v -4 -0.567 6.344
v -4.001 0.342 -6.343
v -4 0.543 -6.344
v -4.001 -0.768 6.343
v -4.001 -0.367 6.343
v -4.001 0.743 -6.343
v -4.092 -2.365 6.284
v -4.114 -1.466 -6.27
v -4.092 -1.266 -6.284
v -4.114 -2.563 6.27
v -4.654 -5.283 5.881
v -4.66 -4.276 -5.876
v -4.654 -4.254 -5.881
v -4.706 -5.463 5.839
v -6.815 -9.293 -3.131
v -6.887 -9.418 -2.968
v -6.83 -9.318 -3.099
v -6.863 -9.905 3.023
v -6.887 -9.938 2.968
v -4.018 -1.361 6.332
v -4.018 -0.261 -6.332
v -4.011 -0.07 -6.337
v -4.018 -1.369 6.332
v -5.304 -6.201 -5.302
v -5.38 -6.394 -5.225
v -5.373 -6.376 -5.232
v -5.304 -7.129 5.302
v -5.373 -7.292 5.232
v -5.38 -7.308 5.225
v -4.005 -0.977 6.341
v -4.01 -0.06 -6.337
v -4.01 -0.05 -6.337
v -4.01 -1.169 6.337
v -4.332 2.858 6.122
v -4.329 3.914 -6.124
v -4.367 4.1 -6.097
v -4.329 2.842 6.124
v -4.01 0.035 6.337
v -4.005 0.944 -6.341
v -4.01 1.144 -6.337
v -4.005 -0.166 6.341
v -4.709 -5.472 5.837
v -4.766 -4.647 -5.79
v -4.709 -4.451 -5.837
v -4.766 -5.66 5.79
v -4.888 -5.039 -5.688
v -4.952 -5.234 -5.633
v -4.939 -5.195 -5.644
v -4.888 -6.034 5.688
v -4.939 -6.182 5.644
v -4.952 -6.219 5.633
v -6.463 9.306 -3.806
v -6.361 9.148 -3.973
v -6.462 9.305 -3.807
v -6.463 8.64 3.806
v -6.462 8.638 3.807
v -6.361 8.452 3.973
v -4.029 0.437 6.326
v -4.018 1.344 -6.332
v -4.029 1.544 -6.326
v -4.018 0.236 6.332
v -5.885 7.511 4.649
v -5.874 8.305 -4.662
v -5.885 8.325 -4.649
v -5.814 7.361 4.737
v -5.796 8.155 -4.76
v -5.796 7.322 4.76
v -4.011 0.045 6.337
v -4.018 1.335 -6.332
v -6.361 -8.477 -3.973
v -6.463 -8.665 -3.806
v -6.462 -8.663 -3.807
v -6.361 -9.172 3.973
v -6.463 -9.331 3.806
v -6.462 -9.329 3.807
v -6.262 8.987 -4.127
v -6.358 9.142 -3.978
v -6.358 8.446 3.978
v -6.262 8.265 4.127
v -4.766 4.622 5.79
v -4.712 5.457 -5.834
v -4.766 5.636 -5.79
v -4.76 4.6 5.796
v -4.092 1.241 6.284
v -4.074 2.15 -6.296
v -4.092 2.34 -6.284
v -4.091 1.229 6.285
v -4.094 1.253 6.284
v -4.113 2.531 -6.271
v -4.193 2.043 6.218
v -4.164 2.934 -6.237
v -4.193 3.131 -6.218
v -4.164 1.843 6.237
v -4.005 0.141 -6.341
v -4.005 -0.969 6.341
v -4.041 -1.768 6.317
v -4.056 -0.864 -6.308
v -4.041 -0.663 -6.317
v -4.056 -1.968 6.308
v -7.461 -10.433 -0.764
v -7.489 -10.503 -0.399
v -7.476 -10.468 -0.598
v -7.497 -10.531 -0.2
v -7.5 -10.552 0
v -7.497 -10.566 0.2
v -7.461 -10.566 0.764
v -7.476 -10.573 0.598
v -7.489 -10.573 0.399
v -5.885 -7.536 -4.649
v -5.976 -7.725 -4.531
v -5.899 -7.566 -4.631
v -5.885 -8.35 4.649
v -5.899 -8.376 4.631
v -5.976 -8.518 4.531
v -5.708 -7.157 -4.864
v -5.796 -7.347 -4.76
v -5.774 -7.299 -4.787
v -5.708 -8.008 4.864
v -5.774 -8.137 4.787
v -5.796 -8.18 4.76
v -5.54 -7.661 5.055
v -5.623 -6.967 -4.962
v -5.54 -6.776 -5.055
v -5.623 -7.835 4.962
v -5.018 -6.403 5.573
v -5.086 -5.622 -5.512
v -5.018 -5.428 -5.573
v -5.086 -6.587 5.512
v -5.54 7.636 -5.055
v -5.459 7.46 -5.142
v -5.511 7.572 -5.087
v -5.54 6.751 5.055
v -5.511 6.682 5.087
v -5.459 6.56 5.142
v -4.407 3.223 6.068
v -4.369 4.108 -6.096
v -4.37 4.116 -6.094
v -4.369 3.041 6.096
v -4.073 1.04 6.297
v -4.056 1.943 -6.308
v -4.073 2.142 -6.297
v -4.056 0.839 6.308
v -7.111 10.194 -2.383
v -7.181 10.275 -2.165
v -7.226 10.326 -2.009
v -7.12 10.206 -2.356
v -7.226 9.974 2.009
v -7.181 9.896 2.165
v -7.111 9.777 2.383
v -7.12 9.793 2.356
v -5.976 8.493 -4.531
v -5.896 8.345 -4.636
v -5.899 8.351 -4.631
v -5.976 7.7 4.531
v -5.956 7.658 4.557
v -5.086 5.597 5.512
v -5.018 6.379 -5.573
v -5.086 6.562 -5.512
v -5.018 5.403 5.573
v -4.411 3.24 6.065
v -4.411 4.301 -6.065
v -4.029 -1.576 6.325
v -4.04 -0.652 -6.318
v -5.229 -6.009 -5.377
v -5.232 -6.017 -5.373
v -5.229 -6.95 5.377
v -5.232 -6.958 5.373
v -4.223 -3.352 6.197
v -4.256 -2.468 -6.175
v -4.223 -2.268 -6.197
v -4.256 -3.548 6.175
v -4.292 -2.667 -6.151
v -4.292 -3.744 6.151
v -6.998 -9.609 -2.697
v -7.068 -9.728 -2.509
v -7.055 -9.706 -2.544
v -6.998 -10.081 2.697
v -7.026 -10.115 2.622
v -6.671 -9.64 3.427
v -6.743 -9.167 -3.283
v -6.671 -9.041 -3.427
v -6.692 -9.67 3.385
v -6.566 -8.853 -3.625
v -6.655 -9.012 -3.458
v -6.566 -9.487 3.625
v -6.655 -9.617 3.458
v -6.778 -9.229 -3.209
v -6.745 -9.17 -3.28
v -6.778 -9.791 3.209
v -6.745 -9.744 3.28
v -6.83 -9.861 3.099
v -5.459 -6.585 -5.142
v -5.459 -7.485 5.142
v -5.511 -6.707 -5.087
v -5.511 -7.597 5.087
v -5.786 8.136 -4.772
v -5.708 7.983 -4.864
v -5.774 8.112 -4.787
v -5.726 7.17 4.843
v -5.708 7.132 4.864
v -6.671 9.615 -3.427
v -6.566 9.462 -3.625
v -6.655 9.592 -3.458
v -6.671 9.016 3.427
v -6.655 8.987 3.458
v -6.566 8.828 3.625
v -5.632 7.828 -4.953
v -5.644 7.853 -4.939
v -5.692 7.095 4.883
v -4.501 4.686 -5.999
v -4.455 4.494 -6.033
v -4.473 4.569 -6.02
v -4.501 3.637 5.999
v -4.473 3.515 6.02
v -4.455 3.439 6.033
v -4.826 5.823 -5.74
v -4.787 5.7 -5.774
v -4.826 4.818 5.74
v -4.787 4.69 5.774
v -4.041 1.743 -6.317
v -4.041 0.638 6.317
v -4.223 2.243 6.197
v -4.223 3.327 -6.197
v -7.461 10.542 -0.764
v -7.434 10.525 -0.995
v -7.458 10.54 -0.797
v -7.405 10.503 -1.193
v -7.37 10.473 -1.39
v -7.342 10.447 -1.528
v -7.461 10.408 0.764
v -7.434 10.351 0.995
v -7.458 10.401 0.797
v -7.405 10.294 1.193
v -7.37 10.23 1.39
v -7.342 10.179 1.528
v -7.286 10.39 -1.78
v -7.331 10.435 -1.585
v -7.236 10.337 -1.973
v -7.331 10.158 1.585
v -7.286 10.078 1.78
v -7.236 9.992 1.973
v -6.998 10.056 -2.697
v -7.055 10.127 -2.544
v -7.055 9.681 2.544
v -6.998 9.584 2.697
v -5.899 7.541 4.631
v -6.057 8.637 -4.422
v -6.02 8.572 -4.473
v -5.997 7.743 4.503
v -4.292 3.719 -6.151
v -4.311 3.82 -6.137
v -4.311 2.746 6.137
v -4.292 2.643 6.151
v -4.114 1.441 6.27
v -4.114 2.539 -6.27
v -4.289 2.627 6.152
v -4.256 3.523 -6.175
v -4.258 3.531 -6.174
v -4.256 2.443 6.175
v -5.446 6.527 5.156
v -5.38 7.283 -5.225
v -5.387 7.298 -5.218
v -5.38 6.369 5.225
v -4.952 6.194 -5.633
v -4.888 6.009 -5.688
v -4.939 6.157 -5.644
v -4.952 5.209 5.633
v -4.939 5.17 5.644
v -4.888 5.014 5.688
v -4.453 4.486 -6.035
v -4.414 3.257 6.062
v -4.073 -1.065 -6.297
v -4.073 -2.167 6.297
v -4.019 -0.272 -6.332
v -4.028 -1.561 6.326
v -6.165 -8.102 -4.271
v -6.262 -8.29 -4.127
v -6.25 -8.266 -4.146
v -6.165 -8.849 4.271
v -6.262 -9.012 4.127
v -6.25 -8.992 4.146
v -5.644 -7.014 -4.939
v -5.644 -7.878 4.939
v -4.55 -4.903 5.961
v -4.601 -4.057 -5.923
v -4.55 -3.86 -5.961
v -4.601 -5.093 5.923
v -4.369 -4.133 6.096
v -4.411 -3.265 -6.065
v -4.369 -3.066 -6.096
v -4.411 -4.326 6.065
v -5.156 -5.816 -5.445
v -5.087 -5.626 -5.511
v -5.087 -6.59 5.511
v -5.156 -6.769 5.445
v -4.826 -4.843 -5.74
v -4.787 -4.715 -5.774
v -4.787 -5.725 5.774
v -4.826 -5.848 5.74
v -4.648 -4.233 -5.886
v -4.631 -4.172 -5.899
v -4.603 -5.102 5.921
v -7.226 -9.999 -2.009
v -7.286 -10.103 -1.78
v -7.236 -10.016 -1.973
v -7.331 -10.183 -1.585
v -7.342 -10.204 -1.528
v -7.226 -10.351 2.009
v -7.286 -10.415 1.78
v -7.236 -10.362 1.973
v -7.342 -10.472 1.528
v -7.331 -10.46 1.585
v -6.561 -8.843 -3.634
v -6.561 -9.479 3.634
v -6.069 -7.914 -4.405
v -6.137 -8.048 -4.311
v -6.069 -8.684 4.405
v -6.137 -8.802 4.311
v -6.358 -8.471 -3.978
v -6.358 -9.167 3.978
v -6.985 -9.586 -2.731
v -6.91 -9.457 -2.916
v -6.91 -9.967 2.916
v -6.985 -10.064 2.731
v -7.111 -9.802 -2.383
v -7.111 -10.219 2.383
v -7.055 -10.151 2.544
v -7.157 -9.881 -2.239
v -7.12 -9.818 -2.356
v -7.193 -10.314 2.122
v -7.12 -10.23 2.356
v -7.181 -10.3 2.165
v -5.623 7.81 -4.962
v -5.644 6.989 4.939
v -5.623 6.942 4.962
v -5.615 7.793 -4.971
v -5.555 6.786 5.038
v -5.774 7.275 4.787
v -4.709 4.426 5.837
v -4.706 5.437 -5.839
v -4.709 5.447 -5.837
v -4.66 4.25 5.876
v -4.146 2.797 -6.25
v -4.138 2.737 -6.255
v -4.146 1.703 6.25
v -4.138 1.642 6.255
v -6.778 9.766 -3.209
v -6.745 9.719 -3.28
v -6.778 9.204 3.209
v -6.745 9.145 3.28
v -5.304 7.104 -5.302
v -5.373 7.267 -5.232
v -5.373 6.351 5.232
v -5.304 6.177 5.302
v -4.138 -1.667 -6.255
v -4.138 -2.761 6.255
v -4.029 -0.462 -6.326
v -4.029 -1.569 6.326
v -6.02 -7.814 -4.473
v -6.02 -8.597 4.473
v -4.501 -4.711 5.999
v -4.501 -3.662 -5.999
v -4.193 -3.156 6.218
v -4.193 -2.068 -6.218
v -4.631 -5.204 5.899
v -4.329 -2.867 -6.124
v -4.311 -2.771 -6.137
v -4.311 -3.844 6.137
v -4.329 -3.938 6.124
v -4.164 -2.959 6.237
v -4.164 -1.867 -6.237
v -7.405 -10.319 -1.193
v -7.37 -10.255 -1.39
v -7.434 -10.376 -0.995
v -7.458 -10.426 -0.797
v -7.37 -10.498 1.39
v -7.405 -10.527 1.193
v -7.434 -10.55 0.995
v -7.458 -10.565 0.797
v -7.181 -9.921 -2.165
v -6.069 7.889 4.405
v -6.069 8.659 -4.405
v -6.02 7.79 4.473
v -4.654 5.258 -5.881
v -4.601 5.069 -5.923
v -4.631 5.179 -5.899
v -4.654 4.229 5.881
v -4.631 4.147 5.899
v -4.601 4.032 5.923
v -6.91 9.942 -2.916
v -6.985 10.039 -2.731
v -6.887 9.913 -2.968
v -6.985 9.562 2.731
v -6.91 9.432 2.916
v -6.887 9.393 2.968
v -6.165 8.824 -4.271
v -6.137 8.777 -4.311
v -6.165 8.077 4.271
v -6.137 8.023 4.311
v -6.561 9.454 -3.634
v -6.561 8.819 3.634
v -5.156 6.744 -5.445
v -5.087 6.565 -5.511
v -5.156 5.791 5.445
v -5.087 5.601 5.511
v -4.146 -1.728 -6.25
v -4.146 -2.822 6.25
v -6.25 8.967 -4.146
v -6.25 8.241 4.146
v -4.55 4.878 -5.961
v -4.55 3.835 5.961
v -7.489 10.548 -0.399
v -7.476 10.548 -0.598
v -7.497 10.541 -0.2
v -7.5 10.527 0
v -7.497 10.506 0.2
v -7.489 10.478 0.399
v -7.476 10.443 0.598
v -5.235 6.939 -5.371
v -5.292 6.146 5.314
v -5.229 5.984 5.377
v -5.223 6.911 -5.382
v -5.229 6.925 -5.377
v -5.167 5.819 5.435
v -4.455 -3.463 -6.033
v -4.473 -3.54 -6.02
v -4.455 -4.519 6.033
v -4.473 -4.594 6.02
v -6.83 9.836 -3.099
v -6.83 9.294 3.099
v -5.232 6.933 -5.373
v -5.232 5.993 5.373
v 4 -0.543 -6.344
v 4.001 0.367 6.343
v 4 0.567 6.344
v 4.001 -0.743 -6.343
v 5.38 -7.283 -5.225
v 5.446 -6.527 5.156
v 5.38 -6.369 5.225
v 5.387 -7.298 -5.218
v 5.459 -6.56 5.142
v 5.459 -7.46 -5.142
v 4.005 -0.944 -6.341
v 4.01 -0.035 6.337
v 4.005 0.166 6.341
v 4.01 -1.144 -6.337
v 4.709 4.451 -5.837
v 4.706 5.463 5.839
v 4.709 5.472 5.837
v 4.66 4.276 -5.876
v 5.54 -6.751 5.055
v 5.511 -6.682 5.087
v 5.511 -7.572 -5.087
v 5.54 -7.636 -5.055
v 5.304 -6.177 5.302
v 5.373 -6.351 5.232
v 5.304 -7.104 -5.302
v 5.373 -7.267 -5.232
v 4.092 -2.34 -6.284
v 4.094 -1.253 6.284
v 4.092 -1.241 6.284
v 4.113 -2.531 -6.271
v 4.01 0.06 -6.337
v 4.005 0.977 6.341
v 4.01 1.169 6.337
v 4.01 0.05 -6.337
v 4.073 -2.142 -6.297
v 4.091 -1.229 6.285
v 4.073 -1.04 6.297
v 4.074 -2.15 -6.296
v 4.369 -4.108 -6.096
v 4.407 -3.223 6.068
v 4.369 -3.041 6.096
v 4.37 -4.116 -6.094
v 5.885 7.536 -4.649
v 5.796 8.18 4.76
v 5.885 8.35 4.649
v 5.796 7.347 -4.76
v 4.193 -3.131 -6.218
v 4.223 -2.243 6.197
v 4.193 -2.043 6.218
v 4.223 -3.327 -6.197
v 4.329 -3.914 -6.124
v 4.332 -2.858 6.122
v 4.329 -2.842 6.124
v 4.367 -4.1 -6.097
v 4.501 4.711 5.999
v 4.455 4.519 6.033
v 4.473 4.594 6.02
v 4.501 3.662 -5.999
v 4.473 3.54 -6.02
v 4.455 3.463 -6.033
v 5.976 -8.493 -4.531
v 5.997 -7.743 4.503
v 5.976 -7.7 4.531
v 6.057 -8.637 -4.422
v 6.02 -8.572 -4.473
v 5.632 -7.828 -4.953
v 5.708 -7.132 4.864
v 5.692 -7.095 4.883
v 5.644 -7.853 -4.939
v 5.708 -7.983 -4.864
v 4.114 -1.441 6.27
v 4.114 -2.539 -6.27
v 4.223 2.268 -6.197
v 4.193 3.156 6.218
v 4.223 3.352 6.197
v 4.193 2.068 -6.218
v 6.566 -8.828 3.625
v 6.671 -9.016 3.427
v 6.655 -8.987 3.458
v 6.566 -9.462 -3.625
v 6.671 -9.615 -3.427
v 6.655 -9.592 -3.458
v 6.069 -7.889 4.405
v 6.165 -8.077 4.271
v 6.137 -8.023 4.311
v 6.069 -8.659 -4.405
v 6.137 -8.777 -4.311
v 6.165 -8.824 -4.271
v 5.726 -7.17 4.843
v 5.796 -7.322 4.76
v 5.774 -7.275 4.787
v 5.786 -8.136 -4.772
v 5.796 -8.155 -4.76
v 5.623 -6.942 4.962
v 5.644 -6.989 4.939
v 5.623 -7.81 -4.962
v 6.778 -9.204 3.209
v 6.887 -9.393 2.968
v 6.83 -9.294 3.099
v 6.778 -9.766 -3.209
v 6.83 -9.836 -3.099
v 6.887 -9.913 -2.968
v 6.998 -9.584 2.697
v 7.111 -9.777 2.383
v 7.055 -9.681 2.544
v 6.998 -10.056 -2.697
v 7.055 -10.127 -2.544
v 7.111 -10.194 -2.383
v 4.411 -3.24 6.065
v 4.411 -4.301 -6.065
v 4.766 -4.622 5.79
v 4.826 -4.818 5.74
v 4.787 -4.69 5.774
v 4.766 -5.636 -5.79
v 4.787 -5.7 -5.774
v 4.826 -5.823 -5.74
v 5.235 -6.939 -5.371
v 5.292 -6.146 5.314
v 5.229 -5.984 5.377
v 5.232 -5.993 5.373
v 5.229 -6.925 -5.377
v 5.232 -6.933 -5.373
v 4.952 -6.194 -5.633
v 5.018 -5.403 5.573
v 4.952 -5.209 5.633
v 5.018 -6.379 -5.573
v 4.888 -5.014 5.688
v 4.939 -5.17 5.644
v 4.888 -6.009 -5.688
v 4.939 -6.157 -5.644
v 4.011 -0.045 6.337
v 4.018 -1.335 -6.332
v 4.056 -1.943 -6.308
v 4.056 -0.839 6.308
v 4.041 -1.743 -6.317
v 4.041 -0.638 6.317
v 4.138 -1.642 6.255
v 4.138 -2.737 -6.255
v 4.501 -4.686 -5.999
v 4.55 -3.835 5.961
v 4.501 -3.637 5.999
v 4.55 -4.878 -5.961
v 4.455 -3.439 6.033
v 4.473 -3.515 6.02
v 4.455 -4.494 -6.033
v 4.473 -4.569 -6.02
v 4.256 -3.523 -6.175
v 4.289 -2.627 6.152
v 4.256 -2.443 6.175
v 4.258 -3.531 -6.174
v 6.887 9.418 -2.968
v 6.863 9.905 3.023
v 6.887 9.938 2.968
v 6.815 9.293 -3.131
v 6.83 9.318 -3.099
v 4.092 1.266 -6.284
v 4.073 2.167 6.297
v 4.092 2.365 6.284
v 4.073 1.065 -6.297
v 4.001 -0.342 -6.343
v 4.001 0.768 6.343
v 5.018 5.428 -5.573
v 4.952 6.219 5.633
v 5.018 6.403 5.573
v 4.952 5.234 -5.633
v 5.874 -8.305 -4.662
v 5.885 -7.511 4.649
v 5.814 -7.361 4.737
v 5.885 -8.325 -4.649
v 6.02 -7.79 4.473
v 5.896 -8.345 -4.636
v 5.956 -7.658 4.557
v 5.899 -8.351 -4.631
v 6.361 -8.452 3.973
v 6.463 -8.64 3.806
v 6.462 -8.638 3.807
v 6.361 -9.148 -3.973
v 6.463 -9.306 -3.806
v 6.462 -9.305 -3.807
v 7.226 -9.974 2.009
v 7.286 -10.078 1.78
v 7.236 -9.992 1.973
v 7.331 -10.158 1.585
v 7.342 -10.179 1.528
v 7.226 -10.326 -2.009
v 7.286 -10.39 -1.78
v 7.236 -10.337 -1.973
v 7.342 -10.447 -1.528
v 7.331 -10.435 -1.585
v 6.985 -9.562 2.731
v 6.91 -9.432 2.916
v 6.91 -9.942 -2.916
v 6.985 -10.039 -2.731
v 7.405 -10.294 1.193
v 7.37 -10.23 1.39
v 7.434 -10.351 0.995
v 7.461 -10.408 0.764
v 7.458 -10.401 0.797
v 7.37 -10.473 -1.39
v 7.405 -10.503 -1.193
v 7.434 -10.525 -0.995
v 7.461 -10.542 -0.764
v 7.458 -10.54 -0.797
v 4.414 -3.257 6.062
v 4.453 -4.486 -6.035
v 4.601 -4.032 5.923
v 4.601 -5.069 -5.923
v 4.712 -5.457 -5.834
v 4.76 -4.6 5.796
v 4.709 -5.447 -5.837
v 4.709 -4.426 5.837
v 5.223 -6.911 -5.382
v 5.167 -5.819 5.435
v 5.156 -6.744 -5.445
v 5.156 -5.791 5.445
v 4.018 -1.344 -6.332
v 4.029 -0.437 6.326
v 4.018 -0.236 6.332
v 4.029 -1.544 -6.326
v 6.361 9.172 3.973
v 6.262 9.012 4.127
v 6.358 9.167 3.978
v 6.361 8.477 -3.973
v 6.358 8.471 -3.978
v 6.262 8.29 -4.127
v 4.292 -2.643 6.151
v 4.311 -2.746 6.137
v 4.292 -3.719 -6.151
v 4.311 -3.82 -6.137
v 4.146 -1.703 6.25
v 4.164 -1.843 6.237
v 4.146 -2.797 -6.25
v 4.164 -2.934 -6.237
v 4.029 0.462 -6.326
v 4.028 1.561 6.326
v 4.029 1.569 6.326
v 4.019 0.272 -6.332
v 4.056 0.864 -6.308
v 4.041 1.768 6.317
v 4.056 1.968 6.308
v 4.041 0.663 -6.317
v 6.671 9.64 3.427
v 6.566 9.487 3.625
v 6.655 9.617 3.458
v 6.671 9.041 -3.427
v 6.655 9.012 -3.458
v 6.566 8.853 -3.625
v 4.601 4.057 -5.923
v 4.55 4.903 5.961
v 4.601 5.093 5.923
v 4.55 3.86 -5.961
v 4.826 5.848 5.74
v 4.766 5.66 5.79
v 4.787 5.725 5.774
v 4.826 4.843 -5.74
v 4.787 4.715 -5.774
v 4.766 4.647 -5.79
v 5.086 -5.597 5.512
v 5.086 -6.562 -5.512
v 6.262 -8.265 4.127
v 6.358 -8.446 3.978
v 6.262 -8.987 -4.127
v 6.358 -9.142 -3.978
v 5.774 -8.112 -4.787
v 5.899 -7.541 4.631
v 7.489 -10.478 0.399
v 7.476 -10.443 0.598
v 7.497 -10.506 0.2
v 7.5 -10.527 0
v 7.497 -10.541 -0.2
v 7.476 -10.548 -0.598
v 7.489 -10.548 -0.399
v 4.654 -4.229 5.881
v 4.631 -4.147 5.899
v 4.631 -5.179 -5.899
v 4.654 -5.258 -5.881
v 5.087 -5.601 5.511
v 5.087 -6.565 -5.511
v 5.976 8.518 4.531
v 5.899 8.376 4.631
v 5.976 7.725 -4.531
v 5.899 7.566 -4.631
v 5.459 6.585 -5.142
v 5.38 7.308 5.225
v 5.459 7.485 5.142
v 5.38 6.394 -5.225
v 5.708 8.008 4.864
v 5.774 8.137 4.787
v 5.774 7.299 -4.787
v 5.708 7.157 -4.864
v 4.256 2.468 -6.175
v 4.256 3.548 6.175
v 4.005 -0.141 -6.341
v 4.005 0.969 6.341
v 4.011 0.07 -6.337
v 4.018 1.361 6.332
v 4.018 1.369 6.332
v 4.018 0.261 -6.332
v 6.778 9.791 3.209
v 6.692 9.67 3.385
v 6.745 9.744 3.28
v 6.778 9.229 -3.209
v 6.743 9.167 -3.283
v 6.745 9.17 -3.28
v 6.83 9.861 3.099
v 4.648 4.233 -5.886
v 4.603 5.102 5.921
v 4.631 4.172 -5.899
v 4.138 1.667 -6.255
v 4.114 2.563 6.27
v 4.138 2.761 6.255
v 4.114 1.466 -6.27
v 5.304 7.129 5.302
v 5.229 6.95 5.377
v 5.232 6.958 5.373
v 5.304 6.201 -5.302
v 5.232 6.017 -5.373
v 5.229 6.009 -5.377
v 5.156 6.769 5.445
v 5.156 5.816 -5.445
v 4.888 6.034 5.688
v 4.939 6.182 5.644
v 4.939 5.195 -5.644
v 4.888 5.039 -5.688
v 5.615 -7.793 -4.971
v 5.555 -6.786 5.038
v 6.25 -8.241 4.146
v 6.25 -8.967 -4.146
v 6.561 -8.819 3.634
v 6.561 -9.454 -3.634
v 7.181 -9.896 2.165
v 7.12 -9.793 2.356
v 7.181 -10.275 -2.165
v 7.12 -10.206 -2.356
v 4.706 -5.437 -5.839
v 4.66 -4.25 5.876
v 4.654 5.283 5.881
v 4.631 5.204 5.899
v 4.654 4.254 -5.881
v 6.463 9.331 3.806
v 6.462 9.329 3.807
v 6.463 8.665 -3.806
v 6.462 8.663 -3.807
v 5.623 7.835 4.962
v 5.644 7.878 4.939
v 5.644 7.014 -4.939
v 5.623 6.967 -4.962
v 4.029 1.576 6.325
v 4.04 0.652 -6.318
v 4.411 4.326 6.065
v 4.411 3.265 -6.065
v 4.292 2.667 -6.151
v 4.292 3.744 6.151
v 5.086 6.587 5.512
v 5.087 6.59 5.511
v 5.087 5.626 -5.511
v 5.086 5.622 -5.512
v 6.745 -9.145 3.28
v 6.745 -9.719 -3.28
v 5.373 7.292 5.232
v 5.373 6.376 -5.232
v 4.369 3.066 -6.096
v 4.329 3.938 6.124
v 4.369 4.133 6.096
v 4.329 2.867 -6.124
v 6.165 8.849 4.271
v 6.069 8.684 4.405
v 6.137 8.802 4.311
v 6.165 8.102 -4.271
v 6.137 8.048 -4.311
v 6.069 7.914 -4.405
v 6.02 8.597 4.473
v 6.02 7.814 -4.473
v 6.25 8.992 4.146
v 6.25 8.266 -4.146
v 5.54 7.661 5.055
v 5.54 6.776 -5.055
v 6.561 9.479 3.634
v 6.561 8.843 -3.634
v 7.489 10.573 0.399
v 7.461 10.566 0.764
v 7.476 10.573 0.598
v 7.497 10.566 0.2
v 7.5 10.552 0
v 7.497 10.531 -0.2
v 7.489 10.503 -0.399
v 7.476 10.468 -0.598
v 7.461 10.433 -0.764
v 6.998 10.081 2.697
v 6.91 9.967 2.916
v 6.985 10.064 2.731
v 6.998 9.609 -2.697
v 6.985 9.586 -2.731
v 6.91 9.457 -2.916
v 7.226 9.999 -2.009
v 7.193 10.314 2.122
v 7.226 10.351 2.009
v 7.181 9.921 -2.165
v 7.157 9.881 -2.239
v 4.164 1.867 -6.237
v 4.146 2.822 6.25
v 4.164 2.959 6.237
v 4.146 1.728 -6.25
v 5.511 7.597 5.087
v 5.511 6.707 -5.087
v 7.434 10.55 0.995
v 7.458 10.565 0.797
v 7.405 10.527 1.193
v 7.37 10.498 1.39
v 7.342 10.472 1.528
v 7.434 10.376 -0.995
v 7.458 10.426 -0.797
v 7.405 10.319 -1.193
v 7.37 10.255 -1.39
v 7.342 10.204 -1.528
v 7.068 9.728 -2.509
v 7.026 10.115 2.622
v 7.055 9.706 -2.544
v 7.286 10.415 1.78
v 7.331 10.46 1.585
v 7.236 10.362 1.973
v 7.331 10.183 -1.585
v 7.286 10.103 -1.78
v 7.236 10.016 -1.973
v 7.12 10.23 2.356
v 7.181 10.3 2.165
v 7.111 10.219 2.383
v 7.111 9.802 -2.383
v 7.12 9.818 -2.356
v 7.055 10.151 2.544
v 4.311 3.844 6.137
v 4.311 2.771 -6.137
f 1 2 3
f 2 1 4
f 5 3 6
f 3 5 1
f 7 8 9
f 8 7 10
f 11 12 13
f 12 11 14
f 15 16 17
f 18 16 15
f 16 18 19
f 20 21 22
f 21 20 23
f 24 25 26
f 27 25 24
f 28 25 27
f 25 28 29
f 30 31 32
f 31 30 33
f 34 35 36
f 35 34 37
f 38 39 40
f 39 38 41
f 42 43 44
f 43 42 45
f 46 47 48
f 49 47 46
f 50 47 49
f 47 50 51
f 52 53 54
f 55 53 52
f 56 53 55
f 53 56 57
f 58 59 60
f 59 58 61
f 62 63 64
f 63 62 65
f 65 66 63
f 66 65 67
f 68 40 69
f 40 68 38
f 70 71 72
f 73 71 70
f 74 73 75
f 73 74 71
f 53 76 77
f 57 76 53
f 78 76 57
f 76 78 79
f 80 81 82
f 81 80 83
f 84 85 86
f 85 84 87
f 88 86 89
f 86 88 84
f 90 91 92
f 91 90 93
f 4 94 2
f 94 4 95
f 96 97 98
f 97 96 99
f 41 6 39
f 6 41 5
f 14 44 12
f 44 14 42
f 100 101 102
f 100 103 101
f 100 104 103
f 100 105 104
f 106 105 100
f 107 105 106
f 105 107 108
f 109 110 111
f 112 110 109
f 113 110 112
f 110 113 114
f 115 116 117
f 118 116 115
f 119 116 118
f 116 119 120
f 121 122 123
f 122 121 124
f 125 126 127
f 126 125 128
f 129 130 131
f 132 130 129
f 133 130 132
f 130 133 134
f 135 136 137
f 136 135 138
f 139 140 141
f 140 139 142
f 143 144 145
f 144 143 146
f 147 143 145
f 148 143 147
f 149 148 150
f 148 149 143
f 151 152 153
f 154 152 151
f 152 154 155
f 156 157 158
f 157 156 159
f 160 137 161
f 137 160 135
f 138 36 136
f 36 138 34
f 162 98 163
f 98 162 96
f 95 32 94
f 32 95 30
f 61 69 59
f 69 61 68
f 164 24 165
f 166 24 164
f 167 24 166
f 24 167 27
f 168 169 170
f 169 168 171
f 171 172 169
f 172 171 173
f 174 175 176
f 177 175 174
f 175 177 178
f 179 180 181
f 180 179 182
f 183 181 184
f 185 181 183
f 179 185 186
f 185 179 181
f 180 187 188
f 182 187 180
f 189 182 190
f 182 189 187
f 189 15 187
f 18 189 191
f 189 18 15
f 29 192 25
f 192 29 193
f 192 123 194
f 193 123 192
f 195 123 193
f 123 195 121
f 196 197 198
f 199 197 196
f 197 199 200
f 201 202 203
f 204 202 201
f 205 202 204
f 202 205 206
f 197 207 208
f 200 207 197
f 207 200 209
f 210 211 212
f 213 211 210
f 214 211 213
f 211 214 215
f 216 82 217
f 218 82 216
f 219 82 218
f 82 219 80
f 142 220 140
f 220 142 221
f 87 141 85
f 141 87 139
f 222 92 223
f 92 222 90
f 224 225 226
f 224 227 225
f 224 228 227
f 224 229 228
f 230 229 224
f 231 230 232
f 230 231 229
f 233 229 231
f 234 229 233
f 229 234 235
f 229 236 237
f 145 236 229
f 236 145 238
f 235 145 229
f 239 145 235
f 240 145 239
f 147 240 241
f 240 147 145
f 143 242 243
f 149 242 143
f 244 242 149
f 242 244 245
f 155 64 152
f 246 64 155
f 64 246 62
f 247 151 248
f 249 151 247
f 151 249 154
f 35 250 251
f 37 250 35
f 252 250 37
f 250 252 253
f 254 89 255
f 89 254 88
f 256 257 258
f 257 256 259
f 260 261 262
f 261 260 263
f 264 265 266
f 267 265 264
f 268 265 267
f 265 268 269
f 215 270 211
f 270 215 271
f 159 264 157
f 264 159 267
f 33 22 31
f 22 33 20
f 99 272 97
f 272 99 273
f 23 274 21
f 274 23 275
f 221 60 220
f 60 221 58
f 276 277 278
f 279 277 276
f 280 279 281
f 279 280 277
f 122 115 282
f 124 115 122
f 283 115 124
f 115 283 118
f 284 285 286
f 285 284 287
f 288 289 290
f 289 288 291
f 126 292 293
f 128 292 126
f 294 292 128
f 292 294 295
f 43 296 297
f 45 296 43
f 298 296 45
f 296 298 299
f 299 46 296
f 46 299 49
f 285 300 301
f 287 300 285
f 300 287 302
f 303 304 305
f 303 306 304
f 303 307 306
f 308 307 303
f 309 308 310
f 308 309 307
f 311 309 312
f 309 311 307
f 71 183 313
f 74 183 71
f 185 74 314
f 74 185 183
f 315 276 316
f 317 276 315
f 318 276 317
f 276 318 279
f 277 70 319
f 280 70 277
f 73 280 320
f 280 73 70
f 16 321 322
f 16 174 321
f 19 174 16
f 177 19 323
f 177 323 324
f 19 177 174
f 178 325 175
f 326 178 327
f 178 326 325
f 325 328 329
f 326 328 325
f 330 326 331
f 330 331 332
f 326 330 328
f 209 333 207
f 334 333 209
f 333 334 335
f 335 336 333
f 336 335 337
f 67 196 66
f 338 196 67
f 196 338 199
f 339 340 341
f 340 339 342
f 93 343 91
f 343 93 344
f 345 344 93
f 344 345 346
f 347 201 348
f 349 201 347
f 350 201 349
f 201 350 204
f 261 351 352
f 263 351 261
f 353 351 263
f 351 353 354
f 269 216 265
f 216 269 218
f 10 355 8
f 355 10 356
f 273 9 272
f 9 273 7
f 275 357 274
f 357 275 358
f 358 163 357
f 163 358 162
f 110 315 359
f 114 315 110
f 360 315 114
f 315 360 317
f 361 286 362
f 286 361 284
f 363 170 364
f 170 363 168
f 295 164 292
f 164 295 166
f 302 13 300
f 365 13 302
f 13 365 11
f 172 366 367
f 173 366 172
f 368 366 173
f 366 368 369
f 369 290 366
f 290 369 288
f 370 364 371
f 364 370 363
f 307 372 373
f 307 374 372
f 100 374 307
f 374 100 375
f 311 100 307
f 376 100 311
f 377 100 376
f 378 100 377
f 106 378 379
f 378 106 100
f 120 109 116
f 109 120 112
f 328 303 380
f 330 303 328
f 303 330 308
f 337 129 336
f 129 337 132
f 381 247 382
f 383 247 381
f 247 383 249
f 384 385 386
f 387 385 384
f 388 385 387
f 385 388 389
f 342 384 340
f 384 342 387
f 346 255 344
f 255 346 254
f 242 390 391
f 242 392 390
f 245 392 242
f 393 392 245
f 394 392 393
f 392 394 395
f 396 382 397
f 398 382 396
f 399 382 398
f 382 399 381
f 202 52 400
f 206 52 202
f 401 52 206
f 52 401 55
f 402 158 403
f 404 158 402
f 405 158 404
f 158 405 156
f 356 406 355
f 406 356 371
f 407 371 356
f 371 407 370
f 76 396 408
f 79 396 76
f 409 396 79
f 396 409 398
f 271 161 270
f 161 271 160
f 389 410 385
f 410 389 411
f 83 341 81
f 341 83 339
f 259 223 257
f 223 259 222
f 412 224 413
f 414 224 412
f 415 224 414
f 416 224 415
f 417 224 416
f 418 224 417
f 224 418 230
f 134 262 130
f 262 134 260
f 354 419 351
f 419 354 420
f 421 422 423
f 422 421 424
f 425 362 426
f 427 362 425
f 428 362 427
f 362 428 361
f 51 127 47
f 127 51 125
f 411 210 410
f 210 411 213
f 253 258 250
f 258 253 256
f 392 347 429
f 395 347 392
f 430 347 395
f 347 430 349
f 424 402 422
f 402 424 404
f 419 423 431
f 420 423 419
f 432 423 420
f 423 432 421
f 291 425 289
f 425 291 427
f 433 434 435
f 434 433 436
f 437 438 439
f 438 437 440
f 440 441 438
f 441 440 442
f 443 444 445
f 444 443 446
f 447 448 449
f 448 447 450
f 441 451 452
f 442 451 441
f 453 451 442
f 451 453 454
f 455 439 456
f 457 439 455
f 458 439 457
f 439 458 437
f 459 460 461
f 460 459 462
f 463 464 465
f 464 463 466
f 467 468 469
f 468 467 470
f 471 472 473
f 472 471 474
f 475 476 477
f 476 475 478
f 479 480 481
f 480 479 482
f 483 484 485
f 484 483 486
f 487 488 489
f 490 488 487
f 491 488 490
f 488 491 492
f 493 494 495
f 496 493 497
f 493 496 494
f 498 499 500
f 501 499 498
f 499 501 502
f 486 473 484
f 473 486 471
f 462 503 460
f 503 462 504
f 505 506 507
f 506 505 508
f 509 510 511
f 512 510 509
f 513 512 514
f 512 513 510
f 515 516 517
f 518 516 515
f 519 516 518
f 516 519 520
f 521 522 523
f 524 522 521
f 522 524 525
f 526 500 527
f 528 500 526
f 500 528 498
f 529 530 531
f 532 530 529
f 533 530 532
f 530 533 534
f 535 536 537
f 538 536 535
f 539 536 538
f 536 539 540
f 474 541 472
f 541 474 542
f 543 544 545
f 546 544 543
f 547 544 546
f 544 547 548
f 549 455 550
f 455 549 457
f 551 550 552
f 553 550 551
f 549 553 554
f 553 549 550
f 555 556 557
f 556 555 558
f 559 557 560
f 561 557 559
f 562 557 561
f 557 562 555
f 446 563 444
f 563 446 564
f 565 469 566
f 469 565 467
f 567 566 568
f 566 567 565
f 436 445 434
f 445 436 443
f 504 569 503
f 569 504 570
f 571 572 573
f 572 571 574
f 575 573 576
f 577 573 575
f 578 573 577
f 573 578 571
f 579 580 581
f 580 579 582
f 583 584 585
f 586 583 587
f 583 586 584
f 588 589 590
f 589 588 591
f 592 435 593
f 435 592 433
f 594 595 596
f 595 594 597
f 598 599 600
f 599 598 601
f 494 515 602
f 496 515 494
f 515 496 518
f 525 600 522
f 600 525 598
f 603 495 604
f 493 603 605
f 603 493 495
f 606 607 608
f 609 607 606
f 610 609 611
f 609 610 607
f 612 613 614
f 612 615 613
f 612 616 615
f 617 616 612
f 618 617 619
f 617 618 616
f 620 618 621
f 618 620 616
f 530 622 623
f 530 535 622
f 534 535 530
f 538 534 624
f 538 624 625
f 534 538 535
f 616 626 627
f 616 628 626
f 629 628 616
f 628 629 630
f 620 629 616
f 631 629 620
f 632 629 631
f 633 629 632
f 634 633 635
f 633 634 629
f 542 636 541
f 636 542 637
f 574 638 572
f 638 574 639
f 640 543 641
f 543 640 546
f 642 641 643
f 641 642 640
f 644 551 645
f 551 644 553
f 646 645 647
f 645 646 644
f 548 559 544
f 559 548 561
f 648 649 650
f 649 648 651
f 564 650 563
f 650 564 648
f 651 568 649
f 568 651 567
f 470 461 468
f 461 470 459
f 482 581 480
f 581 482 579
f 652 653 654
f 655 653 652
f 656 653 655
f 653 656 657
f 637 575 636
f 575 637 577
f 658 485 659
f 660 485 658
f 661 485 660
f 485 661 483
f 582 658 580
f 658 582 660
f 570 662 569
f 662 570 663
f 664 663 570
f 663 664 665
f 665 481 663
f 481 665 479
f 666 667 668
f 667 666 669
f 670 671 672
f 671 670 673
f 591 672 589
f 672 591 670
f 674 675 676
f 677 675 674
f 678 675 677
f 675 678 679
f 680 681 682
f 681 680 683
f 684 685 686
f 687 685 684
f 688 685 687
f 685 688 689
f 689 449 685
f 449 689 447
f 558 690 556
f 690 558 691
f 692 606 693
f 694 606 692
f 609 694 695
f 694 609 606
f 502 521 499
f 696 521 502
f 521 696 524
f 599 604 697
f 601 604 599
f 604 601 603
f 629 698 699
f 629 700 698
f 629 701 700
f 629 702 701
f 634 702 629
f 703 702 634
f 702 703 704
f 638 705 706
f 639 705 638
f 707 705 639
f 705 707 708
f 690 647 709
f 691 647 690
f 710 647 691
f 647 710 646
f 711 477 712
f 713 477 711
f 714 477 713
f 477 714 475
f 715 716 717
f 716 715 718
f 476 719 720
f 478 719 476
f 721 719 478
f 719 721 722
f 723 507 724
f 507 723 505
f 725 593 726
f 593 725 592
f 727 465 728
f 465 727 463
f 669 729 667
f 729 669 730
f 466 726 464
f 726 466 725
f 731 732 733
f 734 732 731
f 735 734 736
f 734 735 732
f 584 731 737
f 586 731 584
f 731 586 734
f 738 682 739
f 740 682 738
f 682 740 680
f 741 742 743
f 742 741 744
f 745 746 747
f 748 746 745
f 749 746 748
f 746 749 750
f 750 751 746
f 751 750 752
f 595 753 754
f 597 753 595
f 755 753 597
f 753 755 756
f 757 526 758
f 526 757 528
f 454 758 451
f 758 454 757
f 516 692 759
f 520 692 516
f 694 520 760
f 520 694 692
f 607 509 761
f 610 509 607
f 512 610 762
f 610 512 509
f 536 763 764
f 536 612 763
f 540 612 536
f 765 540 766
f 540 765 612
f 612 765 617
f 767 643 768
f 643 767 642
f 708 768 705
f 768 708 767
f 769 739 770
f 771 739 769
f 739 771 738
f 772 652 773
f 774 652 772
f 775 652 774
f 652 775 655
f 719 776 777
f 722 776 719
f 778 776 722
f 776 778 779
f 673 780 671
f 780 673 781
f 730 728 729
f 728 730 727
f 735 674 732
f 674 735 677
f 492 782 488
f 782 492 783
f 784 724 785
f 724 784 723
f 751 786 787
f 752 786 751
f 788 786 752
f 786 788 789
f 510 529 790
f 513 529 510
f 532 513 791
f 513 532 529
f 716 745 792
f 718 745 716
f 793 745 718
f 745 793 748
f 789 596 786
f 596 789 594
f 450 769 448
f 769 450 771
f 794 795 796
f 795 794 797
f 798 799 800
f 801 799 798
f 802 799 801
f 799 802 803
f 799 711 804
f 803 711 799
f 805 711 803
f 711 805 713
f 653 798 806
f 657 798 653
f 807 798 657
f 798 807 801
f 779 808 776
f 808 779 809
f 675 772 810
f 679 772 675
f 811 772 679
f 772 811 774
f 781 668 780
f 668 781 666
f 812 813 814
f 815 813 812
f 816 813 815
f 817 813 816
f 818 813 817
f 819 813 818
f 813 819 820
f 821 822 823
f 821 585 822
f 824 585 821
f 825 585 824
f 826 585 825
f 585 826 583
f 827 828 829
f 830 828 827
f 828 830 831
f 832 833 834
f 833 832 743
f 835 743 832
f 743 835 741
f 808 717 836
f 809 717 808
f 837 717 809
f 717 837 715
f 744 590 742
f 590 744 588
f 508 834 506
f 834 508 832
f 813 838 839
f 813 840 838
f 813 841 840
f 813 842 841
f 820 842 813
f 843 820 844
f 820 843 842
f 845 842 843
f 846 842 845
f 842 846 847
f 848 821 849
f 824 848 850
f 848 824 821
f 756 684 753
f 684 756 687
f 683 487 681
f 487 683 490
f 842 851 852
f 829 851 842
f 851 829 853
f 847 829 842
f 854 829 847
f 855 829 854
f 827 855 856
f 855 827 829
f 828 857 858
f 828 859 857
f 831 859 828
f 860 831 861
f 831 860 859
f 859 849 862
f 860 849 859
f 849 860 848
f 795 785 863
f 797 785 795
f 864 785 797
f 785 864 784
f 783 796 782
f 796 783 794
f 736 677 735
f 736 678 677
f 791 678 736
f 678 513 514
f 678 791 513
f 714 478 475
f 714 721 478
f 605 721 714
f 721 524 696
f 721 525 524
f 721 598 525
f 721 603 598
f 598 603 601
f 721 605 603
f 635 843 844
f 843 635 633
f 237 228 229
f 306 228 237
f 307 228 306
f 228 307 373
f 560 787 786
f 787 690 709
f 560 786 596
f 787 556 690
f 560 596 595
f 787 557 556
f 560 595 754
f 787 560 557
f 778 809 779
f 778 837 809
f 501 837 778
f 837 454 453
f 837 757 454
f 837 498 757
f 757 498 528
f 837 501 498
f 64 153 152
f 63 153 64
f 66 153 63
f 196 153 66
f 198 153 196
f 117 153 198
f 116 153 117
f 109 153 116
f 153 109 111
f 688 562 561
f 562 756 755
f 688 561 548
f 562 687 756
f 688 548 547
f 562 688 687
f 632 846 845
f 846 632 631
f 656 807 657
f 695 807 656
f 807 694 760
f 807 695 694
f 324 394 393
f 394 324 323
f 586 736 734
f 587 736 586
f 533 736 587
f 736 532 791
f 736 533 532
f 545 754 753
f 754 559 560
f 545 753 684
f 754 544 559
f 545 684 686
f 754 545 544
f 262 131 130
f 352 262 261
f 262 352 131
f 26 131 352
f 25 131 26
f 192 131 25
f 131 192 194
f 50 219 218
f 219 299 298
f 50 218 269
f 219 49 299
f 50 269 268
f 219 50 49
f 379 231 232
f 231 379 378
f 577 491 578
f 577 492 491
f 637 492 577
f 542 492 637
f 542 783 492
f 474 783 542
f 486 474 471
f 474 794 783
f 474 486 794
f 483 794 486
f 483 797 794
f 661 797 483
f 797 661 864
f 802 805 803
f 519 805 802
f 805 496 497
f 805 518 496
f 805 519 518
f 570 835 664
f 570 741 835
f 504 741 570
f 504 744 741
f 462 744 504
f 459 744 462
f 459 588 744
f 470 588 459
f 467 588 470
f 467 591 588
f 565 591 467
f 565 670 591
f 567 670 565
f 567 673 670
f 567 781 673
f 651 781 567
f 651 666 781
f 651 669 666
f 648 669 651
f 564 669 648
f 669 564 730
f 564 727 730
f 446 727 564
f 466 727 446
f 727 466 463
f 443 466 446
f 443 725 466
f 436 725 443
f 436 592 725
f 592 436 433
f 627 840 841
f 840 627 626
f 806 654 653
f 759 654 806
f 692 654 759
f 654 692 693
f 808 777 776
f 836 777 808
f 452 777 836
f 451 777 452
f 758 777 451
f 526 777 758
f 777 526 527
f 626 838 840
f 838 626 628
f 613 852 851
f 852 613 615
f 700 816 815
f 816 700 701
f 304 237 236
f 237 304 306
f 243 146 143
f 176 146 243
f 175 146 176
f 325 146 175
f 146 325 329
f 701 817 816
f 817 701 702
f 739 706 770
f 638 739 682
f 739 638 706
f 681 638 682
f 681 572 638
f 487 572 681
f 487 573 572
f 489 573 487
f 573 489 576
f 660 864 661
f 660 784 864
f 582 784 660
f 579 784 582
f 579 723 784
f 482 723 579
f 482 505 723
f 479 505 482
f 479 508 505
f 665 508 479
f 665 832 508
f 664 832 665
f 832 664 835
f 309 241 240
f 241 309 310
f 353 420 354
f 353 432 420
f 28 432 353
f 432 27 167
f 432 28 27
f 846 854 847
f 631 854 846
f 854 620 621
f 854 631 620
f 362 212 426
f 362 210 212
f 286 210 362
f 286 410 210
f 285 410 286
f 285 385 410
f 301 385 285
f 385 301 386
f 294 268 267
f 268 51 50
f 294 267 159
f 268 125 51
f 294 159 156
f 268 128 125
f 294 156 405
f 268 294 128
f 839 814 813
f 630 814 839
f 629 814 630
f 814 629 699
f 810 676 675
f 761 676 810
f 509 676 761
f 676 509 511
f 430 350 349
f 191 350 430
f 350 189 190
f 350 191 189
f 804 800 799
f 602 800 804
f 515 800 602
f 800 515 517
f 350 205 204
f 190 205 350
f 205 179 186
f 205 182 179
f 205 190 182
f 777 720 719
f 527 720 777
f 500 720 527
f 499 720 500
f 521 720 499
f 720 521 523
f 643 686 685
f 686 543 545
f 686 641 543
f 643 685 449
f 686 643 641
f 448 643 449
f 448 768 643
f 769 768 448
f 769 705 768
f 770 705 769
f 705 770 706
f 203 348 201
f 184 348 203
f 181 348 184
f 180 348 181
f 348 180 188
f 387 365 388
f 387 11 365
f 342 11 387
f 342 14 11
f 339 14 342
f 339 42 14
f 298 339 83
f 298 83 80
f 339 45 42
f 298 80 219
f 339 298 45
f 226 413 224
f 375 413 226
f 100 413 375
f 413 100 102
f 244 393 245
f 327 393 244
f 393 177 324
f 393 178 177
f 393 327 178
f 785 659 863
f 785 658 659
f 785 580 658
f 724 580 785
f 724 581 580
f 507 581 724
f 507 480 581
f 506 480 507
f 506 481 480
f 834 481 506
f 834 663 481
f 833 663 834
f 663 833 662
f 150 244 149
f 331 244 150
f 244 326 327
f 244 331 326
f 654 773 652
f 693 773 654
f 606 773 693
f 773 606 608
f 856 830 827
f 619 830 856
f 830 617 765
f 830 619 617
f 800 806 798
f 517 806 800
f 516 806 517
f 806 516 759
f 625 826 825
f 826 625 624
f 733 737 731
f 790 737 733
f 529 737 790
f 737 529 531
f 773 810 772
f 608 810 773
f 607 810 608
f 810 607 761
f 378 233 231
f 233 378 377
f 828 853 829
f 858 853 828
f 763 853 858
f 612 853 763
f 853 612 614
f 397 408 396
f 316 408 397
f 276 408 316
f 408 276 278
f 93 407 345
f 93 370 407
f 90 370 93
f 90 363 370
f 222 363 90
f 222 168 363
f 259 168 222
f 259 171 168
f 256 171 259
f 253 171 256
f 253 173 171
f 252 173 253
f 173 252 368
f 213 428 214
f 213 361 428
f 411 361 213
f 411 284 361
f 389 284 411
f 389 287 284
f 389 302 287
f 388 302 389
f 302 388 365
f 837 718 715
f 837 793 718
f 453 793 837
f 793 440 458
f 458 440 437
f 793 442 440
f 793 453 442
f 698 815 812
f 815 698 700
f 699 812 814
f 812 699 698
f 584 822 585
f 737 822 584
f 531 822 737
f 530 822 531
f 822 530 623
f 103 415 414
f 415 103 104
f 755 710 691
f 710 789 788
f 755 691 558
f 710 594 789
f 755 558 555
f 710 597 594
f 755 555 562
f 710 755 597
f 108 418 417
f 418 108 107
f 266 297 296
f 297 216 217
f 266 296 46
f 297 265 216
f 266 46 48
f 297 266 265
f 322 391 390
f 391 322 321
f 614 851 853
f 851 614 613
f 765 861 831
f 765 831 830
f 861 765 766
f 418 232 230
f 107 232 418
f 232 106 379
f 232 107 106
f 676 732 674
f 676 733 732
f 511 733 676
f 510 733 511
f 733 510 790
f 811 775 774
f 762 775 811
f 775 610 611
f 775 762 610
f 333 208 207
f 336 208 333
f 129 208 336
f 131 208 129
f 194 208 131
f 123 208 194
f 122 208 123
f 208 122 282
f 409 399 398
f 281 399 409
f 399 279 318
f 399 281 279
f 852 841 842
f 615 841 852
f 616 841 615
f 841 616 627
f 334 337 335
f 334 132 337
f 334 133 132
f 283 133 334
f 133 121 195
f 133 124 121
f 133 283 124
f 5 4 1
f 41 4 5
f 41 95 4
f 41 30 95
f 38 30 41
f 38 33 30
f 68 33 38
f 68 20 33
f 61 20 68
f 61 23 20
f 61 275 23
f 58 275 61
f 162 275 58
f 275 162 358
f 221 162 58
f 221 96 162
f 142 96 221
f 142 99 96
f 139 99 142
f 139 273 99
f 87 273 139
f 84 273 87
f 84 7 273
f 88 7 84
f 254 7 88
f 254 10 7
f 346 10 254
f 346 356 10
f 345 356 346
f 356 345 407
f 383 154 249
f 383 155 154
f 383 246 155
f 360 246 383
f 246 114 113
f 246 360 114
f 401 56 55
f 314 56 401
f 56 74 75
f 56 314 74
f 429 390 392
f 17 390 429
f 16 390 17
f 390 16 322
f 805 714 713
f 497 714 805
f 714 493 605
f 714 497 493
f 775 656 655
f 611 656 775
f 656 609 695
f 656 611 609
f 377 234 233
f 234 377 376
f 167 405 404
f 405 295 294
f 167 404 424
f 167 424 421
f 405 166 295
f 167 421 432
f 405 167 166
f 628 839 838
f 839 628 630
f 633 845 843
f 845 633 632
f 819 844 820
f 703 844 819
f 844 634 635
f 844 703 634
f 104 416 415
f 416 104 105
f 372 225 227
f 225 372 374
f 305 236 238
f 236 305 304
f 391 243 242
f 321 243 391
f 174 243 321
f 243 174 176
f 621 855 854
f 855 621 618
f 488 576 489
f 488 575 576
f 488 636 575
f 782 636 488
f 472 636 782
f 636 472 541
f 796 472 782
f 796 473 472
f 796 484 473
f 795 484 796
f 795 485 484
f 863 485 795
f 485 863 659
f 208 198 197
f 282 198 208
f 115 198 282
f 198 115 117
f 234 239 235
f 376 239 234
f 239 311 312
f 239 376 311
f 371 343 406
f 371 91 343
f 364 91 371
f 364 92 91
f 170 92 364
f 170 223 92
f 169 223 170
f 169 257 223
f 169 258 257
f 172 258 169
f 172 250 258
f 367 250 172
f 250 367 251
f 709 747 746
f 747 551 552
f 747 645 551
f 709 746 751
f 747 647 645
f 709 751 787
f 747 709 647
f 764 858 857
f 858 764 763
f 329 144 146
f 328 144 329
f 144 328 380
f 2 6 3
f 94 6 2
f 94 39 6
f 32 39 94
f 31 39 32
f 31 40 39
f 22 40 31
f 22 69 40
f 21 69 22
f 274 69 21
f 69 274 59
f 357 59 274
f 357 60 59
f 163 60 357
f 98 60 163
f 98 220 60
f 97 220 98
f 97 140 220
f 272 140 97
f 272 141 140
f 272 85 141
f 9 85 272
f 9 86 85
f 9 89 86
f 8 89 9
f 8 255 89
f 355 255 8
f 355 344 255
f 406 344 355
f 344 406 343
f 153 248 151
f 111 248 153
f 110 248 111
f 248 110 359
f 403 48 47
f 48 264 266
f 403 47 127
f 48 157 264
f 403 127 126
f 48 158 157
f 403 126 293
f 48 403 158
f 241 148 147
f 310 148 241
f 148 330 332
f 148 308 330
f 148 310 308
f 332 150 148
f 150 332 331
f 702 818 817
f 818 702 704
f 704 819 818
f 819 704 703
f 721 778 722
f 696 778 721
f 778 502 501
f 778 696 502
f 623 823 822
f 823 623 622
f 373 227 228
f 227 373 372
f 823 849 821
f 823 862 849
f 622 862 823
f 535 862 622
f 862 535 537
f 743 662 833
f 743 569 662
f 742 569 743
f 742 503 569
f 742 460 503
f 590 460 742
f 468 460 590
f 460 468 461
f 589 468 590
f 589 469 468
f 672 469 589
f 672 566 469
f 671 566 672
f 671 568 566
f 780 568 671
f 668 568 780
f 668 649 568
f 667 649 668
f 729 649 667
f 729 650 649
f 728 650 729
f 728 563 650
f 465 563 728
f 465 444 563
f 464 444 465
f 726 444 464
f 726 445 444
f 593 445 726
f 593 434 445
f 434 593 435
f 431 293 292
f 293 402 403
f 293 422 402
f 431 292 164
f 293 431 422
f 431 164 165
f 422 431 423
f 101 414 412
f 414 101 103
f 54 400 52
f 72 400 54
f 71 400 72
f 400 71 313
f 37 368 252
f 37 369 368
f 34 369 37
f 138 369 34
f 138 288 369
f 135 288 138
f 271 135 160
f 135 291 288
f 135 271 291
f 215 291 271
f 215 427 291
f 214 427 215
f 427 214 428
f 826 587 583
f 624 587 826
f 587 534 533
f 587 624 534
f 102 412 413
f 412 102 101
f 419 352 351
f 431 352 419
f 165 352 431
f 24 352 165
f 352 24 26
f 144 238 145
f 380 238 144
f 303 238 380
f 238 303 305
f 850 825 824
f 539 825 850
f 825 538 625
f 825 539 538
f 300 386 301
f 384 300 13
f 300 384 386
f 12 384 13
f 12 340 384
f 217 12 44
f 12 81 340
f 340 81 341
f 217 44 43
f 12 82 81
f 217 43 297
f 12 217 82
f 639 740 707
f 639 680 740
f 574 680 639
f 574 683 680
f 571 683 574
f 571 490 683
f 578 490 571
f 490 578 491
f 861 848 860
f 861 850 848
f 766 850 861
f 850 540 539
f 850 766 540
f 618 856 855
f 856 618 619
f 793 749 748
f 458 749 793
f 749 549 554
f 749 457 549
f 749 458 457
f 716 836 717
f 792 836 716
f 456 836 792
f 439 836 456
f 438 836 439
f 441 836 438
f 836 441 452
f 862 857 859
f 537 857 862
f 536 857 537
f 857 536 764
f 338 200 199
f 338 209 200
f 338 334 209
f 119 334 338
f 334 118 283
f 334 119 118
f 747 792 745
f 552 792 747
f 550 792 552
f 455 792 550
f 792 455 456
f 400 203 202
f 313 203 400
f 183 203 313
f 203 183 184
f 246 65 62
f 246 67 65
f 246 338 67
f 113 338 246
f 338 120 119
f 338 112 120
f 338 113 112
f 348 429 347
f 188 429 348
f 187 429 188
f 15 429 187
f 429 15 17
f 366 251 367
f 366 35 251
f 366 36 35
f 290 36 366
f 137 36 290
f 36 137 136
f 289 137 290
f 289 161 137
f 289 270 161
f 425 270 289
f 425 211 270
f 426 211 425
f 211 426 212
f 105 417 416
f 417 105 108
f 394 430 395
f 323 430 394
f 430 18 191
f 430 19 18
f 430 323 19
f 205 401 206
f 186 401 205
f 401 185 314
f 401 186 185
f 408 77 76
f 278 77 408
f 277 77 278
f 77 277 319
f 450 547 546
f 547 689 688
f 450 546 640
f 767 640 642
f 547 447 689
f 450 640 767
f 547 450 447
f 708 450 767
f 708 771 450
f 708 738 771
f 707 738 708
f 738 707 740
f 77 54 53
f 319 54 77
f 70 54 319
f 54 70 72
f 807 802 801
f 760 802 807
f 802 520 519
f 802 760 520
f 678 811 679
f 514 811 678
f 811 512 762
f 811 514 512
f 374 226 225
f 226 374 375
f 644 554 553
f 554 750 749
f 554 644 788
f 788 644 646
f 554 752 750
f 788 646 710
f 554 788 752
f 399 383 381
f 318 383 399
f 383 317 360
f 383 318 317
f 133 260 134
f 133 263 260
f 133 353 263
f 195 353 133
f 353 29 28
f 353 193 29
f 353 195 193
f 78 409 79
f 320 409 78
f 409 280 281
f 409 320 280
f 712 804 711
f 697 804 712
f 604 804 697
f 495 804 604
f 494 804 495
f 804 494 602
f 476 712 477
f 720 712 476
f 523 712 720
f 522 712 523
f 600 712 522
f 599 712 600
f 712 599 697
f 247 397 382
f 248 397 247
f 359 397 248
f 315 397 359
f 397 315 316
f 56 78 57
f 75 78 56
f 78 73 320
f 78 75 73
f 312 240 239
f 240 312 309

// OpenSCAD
$fa=0.01;
$fs=0.2;

// flywheel
fw_dist = 43; // separation between centers of flywheels
fw_h = 14; // height of flywheel
fw_od = 35; // diameter
fw_angle = 5; // canted angle
fw_offset = 0.6; // adjust the alignment of flywheels

cage_od = 41;

barrel_d = 15;
funnel_h = 6;

fw_x = fw_dist / 2;
fw_z = -fw_h / 2;

intersection()
{
    // flywheel cylinders
    fw_xfrm = [[[-fw_x, fw_offset, fw_z],  fw_angle, [1, 0, 0]],
                 [[ fw_x, -fw_offset, fw_z], -fw_angle, [1, 0, 0]]];
    for(xfrm = fw_xfrm)
        translate(xfrm[0]) rotate(xfrm[1], xfrm[2])   
            cylinder(d = fw_od, h = fw_h);

    // carve out the barrel
    translate([0, -funnel_h - 1, 0]) rotate(90, [1, 0, 0])
        cylinder(d = barrel_d, h = cage_od + 2, center = true);
}
